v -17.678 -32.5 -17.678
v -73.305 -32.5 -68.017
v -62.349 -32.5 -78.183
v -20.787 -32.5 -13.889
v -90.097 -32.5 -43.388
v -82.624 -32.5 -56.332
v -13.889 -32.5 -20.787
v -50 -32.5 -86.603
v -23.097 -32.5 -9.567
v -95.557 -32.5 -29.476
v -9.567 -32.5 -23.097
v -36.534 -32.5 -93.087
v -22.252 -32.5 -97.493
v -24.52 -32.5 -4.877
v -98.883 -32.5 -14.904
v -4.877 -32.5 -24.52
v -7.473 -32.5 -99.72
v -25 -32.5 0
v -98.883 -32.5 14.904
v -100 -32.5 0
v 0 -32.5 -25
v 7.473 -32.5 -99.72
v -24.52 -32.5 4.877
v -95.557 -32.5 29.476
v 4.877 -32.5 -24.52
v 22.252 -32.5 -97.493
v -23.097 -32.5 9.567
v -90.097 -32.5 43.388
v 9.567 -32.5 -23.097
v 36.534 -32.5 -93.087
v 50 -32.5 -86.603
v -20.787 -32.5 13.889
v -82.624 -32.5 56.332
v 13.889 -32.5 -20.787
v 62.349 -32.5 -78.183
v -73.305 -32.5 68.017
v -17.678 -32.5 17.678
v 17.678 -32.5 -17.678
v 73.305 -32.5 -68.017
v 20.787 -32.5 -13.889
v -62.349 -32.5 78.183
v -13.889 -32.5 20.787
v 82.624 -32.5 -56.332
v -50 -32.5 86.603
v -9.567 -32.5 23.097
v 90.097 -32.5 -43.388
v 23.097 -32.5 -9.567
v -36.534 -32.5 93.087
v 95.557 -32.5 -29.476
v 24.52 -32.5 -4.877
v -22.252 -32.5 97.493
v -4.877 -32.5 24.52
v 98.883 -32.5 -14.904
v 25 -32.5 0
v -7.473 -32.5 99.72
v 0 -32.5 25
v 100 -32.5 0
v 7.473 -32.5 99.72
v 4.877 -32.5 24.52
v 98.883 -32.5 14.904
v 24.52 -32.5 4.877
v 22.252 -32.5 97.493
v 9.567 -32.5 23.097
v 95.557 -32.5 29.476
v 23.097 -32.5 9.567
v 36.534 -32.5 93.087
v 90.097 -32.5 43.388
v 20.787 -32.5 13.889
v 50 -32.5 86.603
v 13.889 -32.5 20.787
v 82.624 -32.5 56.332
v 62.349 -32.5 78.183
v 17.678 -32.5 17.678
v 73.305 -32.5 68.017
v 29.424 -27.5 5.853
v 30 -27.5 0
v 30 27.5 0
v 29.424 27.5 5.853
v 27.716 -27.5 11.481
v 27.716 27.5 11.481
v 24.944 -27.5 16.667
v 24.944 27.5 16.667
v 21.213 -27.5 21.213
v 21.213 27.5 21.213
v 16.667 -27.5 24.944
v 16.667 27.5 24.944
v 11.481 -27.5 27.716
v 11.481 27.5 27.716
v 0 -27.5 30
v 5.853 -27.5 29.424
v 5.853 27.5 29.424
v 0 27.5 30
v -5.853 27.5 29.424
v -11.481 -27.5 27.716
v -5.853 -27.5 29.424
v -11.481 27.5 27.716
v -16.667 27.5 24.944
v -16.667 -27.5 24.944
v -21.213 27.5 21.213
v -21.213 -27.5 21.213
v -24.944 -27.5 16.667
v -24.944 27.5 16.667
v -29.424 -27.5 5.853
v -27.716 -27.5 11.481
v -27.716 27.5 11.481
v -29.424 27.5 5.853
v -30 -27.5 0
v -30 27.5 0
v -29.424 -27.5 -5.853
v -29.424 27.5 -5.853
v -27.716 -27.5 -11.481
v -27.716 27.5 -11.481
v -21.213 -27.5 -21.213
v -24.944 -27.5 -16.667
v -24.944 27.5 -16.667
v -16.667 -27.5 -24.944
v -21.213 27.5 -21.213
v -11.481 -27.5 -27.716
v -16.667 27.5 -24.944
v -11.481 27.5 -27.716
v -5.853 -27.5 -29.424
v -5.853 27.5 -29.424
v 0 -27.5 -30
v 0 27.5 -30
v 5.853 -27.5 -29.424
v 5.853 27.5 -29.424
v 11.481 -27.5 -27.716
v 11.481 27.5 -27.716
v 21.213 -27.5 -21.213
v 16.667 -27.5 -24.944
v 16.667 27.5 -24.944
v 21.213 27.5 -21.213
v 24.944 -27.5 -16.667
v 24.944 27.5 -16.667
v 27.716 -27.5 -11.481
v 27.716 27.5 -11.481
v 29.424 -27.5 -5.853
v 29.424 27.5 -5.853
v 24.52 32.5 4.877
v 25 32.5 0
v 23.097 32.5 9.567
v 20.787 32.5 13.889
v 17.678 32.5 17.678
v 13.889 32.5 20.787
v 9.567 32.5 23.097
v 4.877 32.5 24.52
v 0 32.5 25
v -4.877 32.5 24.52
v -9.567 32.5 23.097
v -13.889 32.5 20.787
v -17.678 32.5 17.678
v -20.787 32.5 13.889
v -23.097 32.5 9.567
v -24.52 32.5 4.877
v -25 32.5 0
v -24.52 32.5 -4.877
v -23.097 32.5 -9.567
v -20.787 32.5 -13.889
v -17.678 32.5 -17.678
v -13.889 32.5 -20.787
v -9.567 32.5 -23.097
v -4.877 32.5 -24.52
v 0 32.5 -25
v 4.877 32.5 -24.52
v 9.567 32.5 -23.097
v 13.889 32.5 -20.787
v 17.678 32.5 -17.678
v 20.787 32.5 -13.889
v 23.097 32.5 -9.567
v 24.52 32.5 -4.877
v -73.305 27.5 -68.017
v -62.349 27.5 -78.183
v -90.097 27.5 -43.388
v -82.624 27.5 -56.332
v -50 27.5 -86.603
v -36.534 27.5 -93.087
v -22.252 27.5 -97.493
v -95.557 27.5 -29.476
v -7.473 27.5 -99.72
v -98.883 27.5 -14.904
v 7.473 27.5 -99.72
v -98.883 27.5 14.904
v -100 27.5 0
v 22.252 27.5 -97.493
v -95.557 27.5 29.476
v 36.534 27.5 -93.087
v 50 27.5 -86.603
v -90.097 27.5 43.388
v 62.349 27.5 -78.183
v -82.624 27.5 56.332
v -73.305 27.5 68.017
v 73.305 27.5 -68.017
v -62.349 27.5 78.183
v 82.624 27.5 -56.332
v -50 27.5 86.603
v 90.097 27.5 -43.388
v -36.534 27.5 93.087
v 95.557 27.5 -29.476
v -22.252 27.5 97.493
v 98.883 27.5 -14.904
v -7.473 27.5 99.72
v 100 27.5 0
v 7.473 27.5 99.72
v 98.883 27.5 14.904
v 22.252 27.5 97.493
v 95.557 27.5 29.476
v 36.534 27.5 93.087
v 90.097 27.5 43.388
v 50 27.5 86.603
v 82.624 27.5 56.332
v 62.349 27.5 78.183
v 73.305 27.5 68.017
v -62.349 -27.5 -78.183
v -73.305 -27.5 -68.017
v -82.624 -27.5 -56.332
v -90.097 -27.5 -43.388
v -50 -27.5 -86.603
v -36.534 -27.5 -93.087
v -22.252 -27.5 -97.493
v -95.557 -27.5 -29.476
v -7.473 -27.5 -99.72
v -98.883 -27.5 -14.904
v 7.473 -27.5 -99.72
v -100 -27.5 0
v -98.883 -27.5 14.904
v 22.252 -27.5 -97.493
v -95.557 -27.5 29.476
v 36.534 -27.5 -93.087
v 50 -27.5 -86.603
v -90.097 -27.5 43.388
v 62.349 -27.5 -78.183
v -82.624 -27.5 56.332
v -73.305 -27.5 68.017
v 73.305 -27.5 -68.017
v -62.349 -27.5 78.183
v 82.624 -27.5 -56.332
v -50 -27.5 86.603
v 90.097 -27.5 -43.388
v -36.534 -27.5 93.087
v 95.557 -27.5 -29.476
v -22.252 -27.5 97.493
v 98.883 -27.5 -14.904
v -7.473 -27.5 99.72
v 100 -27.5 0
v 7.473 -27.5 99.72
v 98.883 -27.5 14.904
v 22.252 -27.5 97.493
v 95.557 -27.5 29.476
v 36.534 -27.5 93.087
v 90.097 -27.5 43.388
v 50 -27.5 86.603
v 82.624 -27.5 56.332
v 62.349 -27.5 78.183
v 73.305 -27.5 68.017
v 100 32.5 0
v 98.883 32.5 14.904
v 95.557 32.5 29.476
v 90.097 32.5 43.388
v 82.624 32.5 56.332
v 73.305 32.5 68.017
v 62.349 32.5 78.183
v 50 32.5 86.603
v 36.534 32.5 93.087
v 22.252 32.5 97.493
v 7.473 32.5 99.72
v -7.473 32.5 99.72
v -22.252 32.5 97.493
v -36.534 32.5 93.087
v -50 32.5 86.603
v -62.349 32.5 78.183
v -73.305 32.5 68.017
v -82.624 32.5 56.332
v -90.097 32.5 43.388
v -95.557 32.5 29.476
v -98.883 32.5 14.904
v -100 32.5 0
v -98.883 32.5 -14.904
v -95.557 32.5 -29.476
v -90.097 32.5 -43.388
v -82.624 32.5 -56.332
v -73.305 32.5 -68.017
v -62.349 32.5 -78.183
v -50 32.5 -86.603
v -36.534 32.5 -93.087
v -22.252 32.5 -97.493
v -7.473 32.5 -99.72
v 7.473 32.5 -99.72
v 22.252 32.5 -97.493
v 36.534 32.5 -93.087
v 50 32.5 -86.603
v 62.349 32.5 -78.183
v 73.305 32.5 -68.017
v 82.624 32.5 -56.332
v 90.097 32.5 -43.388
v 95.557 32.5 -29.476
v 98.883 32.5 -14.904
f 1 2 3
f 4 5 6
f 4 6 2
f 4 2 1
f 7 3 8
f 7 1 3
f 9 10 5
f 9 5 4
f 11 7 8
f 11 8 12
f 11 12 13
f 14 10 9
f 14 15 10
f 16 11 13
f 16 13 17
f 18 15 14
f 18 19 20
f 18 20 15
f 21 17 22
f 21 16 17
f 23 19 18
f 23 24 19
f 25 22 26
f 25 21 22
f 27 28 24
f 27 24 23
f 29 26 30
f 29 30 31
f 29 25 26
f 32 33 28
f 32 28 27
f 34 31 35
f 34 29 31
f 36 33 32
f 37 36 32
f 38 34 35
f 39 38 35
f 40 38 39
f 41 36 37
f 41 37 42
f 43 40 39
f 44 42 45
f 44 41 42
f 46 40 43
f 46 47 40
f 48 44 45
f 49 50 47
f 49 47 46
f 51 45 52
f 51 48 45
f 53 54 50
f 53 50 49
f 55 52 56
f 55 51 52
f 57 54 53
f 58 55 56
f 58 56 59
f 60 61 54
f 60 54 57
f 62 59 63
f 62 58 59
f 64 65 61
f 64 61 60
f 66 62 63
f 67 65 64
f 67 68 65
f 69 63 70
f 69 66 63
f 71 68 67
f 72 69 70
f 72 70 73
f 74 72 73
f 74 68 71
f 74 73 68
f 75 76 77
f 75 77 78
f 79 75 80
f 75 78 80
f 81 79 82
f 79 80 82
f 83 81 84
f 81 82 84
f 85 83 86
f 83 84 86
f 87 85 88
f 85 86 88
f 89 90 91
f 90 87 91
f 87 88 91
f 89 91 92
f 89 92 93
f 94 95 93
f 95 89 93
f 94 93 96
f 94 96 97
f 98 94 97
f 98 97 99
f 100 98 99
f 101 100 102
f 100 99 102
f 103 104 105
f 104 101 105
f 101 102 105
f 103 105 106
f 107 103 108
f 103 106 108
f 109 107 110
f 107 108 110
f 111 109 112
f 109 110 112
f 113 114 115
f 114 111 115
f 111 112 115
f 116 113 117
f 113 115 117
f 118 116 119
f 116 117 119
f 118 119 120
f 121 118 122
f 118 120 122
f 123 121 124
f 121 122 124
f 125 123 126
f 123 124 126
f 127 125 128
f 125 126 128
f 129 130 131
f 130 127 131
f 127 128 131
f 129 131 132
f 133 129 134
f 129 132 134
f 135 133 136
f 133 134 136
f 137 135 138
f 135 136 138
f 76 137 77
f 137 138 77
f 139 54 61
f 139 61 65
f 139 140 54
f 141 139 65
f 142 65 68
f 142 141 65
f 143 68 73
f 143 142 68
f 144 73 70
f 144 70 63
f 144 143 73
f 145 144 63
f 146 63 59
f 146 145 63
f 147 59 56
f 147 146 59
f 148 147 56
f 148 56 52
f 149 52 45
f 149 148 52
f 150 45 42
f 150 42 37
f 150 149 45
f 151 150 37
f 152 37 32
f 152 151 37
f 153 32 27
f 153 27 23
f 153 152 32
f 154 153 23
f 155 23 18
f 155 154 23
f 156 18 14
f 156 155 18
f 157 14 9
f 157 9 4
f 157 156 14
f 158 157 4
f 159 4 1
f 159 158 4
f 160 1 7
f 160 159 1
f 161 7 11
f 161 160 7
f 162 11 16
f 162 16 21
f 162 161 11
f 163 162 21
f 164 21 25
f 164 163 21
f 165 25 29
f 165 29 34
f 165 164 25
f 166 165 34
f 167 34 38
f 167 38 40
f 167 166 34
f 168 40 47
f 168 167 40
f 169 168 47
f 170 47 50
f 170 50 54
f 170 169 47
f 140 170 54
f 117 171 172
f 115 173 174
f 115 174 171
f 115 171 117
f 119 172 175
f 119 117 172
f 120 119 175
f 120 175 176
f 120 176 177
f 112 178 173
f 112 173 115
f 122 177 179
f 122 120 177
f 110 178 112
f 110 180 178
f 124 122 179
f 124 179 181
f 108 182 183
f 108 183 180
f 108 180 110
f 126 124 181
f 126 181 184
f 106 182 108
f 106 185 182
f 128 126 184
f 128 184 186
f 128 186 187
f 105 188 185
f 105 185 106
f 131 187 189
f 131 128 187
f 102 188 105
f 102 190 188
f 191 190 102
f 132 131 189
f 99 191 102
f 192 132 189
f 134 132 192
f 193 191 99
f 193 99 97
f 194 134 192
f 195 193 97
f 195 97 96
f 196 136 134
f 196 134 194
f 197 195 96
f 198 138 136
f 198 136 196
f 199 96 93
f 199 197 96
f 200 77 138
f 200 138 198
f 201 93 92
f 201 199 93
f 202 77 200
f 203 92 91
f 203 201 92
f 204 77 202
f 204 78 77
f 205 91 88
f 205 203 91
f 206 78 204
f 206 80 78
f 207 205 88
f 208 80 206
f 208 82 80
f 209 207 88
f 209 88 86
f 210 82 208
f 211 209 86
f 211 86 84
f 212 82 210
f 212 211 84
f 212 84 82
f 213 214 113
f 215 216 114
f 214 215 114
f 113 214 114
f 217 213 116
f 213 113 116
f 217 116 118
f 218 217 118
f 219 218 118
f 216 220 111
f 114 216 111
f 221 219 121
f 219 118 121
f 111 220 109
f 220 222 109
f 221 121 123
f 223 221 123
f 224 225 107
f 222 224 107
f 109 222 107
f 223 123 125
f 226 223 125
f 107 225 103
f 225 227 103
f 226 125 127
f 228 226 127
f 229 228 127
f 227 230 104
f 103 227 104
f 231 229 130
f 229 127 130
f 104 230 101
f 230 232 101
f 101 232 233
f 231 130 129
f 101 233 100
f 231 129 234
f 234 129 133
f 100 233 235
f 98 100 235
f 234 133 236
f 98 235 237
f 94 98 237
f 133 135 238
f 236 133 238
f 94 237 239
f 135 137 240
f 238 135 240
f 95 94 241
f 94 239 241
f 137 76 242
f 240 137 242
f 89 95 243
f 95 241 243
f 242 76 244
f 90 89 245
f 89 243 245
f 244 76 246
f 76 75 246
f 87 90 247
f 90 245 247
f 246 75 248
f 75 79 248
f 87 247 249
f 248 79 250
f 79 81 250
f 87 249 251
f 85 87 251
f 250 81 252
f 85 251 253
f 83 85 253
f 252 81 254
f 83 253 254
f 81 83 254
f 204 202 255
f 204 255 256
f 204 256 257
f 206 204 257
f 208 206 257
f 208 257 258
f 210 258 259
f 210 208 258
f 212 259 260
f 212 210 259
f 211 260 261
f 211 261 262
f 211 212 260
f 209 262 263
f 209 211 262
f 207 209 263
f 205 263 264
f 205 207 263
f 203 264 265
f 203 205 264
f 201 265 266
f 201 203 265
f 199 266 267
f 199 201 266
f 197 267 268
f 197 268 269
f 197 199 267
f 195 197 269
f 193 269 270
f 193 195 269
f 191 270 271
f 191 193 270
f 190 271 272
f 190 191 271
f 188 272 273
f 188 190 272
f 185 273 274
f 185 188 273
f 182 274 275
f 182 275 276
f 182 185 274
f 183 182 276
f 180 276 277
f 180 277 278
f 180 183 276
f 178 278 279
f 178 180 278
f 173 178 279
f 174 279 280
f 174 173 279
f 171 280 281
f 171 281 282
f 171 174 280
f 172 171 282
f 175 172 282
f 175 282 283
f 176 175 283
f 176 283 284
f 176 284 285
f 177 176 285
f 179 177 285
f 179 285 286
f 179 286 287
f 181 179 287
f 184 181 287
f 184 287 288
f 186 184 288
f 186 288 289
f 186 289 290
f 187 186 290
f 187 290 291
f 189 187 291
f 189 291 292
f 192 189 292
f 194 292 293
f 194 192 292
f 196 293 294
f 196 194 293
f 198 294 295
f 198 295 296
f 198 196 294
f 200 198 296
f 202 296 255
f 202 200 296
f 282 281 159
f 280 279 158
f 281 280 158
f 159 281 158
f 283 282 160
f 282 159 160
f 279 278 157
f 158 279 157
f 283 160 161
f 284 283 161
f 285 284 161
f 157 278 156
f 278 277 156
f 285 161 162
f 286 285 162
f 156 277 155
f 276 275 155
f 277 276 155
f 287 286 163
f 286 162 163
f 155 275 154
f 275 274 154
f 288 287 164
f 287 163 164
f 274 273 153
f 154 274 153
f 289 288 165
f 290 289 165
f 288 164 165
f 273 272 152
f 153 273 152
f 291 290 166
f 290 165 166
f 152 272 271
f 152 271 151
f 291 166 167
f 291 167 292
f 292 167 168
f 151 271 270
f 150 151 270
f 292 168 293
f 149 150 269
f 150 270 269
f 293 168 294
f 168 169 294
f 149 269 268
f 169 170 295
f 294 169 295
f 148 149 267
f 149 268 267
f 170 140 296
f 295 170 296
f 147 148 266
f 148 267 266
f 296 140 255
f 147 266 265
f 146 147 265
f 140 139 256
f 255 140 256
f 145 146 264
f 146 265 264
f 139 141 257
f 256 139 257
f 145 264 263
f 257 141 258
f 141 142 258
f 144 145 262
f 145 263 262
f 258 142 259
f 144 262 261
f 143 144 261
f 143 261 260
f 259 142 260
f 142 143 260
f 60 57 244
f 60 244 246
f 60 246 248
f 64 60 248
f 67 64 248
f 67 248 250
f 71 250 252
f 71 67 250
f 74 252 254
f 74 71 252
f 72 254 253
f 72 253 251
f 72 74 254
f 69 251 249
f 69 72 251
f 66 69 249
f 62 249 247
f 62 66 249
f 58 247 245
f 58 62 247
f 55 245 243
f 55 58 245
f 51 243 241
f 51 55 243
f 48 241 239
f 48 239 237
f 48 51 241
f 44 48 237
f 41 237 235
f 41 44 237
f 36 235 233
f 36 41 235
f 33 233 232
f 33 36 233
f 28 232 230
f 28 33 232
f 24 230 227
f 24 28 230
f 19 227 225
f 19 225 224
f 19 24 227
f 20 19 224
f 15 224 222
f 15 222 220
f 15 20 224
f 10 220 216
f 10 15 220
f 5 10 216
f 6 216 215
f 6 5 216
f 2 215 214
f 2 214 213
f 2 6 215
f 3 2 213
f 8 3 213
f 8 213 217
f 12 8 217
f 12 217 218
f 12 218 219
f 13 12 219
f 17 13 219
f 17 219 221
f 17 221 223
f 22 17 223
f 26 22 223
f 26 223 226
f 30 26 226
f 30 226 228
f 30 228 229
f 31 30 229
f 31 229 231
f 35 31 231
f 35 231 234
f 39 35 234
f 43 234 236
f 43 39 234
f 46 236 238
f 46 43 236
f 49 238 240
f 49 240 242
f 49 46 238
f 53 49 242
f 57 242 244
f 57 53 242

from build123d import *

# Parameters (mm, degrees)
F0_R     = 100
F0_R_2   = 25
F1_DEPTH = 32.5
F2_T     = -5


with BuildPart() as f1:
    # F0 (on Front) → F1 (new body, symmetric)
    with BuildSketch(Plane.XZ):
        Circle(F0_R)
        Circle(F0_R_2, mode=Mode.SUBTRACT)
    extrude(amount=F1_DEPTH, both=True)

    # F2
    f2_openings = [f1.faces().sort_by_distance(p)[0] for p in [
        (-100, 0, 0),
    ]]
    offset(amount=F2_T, openings=f2_openings)


solid = f1.part
